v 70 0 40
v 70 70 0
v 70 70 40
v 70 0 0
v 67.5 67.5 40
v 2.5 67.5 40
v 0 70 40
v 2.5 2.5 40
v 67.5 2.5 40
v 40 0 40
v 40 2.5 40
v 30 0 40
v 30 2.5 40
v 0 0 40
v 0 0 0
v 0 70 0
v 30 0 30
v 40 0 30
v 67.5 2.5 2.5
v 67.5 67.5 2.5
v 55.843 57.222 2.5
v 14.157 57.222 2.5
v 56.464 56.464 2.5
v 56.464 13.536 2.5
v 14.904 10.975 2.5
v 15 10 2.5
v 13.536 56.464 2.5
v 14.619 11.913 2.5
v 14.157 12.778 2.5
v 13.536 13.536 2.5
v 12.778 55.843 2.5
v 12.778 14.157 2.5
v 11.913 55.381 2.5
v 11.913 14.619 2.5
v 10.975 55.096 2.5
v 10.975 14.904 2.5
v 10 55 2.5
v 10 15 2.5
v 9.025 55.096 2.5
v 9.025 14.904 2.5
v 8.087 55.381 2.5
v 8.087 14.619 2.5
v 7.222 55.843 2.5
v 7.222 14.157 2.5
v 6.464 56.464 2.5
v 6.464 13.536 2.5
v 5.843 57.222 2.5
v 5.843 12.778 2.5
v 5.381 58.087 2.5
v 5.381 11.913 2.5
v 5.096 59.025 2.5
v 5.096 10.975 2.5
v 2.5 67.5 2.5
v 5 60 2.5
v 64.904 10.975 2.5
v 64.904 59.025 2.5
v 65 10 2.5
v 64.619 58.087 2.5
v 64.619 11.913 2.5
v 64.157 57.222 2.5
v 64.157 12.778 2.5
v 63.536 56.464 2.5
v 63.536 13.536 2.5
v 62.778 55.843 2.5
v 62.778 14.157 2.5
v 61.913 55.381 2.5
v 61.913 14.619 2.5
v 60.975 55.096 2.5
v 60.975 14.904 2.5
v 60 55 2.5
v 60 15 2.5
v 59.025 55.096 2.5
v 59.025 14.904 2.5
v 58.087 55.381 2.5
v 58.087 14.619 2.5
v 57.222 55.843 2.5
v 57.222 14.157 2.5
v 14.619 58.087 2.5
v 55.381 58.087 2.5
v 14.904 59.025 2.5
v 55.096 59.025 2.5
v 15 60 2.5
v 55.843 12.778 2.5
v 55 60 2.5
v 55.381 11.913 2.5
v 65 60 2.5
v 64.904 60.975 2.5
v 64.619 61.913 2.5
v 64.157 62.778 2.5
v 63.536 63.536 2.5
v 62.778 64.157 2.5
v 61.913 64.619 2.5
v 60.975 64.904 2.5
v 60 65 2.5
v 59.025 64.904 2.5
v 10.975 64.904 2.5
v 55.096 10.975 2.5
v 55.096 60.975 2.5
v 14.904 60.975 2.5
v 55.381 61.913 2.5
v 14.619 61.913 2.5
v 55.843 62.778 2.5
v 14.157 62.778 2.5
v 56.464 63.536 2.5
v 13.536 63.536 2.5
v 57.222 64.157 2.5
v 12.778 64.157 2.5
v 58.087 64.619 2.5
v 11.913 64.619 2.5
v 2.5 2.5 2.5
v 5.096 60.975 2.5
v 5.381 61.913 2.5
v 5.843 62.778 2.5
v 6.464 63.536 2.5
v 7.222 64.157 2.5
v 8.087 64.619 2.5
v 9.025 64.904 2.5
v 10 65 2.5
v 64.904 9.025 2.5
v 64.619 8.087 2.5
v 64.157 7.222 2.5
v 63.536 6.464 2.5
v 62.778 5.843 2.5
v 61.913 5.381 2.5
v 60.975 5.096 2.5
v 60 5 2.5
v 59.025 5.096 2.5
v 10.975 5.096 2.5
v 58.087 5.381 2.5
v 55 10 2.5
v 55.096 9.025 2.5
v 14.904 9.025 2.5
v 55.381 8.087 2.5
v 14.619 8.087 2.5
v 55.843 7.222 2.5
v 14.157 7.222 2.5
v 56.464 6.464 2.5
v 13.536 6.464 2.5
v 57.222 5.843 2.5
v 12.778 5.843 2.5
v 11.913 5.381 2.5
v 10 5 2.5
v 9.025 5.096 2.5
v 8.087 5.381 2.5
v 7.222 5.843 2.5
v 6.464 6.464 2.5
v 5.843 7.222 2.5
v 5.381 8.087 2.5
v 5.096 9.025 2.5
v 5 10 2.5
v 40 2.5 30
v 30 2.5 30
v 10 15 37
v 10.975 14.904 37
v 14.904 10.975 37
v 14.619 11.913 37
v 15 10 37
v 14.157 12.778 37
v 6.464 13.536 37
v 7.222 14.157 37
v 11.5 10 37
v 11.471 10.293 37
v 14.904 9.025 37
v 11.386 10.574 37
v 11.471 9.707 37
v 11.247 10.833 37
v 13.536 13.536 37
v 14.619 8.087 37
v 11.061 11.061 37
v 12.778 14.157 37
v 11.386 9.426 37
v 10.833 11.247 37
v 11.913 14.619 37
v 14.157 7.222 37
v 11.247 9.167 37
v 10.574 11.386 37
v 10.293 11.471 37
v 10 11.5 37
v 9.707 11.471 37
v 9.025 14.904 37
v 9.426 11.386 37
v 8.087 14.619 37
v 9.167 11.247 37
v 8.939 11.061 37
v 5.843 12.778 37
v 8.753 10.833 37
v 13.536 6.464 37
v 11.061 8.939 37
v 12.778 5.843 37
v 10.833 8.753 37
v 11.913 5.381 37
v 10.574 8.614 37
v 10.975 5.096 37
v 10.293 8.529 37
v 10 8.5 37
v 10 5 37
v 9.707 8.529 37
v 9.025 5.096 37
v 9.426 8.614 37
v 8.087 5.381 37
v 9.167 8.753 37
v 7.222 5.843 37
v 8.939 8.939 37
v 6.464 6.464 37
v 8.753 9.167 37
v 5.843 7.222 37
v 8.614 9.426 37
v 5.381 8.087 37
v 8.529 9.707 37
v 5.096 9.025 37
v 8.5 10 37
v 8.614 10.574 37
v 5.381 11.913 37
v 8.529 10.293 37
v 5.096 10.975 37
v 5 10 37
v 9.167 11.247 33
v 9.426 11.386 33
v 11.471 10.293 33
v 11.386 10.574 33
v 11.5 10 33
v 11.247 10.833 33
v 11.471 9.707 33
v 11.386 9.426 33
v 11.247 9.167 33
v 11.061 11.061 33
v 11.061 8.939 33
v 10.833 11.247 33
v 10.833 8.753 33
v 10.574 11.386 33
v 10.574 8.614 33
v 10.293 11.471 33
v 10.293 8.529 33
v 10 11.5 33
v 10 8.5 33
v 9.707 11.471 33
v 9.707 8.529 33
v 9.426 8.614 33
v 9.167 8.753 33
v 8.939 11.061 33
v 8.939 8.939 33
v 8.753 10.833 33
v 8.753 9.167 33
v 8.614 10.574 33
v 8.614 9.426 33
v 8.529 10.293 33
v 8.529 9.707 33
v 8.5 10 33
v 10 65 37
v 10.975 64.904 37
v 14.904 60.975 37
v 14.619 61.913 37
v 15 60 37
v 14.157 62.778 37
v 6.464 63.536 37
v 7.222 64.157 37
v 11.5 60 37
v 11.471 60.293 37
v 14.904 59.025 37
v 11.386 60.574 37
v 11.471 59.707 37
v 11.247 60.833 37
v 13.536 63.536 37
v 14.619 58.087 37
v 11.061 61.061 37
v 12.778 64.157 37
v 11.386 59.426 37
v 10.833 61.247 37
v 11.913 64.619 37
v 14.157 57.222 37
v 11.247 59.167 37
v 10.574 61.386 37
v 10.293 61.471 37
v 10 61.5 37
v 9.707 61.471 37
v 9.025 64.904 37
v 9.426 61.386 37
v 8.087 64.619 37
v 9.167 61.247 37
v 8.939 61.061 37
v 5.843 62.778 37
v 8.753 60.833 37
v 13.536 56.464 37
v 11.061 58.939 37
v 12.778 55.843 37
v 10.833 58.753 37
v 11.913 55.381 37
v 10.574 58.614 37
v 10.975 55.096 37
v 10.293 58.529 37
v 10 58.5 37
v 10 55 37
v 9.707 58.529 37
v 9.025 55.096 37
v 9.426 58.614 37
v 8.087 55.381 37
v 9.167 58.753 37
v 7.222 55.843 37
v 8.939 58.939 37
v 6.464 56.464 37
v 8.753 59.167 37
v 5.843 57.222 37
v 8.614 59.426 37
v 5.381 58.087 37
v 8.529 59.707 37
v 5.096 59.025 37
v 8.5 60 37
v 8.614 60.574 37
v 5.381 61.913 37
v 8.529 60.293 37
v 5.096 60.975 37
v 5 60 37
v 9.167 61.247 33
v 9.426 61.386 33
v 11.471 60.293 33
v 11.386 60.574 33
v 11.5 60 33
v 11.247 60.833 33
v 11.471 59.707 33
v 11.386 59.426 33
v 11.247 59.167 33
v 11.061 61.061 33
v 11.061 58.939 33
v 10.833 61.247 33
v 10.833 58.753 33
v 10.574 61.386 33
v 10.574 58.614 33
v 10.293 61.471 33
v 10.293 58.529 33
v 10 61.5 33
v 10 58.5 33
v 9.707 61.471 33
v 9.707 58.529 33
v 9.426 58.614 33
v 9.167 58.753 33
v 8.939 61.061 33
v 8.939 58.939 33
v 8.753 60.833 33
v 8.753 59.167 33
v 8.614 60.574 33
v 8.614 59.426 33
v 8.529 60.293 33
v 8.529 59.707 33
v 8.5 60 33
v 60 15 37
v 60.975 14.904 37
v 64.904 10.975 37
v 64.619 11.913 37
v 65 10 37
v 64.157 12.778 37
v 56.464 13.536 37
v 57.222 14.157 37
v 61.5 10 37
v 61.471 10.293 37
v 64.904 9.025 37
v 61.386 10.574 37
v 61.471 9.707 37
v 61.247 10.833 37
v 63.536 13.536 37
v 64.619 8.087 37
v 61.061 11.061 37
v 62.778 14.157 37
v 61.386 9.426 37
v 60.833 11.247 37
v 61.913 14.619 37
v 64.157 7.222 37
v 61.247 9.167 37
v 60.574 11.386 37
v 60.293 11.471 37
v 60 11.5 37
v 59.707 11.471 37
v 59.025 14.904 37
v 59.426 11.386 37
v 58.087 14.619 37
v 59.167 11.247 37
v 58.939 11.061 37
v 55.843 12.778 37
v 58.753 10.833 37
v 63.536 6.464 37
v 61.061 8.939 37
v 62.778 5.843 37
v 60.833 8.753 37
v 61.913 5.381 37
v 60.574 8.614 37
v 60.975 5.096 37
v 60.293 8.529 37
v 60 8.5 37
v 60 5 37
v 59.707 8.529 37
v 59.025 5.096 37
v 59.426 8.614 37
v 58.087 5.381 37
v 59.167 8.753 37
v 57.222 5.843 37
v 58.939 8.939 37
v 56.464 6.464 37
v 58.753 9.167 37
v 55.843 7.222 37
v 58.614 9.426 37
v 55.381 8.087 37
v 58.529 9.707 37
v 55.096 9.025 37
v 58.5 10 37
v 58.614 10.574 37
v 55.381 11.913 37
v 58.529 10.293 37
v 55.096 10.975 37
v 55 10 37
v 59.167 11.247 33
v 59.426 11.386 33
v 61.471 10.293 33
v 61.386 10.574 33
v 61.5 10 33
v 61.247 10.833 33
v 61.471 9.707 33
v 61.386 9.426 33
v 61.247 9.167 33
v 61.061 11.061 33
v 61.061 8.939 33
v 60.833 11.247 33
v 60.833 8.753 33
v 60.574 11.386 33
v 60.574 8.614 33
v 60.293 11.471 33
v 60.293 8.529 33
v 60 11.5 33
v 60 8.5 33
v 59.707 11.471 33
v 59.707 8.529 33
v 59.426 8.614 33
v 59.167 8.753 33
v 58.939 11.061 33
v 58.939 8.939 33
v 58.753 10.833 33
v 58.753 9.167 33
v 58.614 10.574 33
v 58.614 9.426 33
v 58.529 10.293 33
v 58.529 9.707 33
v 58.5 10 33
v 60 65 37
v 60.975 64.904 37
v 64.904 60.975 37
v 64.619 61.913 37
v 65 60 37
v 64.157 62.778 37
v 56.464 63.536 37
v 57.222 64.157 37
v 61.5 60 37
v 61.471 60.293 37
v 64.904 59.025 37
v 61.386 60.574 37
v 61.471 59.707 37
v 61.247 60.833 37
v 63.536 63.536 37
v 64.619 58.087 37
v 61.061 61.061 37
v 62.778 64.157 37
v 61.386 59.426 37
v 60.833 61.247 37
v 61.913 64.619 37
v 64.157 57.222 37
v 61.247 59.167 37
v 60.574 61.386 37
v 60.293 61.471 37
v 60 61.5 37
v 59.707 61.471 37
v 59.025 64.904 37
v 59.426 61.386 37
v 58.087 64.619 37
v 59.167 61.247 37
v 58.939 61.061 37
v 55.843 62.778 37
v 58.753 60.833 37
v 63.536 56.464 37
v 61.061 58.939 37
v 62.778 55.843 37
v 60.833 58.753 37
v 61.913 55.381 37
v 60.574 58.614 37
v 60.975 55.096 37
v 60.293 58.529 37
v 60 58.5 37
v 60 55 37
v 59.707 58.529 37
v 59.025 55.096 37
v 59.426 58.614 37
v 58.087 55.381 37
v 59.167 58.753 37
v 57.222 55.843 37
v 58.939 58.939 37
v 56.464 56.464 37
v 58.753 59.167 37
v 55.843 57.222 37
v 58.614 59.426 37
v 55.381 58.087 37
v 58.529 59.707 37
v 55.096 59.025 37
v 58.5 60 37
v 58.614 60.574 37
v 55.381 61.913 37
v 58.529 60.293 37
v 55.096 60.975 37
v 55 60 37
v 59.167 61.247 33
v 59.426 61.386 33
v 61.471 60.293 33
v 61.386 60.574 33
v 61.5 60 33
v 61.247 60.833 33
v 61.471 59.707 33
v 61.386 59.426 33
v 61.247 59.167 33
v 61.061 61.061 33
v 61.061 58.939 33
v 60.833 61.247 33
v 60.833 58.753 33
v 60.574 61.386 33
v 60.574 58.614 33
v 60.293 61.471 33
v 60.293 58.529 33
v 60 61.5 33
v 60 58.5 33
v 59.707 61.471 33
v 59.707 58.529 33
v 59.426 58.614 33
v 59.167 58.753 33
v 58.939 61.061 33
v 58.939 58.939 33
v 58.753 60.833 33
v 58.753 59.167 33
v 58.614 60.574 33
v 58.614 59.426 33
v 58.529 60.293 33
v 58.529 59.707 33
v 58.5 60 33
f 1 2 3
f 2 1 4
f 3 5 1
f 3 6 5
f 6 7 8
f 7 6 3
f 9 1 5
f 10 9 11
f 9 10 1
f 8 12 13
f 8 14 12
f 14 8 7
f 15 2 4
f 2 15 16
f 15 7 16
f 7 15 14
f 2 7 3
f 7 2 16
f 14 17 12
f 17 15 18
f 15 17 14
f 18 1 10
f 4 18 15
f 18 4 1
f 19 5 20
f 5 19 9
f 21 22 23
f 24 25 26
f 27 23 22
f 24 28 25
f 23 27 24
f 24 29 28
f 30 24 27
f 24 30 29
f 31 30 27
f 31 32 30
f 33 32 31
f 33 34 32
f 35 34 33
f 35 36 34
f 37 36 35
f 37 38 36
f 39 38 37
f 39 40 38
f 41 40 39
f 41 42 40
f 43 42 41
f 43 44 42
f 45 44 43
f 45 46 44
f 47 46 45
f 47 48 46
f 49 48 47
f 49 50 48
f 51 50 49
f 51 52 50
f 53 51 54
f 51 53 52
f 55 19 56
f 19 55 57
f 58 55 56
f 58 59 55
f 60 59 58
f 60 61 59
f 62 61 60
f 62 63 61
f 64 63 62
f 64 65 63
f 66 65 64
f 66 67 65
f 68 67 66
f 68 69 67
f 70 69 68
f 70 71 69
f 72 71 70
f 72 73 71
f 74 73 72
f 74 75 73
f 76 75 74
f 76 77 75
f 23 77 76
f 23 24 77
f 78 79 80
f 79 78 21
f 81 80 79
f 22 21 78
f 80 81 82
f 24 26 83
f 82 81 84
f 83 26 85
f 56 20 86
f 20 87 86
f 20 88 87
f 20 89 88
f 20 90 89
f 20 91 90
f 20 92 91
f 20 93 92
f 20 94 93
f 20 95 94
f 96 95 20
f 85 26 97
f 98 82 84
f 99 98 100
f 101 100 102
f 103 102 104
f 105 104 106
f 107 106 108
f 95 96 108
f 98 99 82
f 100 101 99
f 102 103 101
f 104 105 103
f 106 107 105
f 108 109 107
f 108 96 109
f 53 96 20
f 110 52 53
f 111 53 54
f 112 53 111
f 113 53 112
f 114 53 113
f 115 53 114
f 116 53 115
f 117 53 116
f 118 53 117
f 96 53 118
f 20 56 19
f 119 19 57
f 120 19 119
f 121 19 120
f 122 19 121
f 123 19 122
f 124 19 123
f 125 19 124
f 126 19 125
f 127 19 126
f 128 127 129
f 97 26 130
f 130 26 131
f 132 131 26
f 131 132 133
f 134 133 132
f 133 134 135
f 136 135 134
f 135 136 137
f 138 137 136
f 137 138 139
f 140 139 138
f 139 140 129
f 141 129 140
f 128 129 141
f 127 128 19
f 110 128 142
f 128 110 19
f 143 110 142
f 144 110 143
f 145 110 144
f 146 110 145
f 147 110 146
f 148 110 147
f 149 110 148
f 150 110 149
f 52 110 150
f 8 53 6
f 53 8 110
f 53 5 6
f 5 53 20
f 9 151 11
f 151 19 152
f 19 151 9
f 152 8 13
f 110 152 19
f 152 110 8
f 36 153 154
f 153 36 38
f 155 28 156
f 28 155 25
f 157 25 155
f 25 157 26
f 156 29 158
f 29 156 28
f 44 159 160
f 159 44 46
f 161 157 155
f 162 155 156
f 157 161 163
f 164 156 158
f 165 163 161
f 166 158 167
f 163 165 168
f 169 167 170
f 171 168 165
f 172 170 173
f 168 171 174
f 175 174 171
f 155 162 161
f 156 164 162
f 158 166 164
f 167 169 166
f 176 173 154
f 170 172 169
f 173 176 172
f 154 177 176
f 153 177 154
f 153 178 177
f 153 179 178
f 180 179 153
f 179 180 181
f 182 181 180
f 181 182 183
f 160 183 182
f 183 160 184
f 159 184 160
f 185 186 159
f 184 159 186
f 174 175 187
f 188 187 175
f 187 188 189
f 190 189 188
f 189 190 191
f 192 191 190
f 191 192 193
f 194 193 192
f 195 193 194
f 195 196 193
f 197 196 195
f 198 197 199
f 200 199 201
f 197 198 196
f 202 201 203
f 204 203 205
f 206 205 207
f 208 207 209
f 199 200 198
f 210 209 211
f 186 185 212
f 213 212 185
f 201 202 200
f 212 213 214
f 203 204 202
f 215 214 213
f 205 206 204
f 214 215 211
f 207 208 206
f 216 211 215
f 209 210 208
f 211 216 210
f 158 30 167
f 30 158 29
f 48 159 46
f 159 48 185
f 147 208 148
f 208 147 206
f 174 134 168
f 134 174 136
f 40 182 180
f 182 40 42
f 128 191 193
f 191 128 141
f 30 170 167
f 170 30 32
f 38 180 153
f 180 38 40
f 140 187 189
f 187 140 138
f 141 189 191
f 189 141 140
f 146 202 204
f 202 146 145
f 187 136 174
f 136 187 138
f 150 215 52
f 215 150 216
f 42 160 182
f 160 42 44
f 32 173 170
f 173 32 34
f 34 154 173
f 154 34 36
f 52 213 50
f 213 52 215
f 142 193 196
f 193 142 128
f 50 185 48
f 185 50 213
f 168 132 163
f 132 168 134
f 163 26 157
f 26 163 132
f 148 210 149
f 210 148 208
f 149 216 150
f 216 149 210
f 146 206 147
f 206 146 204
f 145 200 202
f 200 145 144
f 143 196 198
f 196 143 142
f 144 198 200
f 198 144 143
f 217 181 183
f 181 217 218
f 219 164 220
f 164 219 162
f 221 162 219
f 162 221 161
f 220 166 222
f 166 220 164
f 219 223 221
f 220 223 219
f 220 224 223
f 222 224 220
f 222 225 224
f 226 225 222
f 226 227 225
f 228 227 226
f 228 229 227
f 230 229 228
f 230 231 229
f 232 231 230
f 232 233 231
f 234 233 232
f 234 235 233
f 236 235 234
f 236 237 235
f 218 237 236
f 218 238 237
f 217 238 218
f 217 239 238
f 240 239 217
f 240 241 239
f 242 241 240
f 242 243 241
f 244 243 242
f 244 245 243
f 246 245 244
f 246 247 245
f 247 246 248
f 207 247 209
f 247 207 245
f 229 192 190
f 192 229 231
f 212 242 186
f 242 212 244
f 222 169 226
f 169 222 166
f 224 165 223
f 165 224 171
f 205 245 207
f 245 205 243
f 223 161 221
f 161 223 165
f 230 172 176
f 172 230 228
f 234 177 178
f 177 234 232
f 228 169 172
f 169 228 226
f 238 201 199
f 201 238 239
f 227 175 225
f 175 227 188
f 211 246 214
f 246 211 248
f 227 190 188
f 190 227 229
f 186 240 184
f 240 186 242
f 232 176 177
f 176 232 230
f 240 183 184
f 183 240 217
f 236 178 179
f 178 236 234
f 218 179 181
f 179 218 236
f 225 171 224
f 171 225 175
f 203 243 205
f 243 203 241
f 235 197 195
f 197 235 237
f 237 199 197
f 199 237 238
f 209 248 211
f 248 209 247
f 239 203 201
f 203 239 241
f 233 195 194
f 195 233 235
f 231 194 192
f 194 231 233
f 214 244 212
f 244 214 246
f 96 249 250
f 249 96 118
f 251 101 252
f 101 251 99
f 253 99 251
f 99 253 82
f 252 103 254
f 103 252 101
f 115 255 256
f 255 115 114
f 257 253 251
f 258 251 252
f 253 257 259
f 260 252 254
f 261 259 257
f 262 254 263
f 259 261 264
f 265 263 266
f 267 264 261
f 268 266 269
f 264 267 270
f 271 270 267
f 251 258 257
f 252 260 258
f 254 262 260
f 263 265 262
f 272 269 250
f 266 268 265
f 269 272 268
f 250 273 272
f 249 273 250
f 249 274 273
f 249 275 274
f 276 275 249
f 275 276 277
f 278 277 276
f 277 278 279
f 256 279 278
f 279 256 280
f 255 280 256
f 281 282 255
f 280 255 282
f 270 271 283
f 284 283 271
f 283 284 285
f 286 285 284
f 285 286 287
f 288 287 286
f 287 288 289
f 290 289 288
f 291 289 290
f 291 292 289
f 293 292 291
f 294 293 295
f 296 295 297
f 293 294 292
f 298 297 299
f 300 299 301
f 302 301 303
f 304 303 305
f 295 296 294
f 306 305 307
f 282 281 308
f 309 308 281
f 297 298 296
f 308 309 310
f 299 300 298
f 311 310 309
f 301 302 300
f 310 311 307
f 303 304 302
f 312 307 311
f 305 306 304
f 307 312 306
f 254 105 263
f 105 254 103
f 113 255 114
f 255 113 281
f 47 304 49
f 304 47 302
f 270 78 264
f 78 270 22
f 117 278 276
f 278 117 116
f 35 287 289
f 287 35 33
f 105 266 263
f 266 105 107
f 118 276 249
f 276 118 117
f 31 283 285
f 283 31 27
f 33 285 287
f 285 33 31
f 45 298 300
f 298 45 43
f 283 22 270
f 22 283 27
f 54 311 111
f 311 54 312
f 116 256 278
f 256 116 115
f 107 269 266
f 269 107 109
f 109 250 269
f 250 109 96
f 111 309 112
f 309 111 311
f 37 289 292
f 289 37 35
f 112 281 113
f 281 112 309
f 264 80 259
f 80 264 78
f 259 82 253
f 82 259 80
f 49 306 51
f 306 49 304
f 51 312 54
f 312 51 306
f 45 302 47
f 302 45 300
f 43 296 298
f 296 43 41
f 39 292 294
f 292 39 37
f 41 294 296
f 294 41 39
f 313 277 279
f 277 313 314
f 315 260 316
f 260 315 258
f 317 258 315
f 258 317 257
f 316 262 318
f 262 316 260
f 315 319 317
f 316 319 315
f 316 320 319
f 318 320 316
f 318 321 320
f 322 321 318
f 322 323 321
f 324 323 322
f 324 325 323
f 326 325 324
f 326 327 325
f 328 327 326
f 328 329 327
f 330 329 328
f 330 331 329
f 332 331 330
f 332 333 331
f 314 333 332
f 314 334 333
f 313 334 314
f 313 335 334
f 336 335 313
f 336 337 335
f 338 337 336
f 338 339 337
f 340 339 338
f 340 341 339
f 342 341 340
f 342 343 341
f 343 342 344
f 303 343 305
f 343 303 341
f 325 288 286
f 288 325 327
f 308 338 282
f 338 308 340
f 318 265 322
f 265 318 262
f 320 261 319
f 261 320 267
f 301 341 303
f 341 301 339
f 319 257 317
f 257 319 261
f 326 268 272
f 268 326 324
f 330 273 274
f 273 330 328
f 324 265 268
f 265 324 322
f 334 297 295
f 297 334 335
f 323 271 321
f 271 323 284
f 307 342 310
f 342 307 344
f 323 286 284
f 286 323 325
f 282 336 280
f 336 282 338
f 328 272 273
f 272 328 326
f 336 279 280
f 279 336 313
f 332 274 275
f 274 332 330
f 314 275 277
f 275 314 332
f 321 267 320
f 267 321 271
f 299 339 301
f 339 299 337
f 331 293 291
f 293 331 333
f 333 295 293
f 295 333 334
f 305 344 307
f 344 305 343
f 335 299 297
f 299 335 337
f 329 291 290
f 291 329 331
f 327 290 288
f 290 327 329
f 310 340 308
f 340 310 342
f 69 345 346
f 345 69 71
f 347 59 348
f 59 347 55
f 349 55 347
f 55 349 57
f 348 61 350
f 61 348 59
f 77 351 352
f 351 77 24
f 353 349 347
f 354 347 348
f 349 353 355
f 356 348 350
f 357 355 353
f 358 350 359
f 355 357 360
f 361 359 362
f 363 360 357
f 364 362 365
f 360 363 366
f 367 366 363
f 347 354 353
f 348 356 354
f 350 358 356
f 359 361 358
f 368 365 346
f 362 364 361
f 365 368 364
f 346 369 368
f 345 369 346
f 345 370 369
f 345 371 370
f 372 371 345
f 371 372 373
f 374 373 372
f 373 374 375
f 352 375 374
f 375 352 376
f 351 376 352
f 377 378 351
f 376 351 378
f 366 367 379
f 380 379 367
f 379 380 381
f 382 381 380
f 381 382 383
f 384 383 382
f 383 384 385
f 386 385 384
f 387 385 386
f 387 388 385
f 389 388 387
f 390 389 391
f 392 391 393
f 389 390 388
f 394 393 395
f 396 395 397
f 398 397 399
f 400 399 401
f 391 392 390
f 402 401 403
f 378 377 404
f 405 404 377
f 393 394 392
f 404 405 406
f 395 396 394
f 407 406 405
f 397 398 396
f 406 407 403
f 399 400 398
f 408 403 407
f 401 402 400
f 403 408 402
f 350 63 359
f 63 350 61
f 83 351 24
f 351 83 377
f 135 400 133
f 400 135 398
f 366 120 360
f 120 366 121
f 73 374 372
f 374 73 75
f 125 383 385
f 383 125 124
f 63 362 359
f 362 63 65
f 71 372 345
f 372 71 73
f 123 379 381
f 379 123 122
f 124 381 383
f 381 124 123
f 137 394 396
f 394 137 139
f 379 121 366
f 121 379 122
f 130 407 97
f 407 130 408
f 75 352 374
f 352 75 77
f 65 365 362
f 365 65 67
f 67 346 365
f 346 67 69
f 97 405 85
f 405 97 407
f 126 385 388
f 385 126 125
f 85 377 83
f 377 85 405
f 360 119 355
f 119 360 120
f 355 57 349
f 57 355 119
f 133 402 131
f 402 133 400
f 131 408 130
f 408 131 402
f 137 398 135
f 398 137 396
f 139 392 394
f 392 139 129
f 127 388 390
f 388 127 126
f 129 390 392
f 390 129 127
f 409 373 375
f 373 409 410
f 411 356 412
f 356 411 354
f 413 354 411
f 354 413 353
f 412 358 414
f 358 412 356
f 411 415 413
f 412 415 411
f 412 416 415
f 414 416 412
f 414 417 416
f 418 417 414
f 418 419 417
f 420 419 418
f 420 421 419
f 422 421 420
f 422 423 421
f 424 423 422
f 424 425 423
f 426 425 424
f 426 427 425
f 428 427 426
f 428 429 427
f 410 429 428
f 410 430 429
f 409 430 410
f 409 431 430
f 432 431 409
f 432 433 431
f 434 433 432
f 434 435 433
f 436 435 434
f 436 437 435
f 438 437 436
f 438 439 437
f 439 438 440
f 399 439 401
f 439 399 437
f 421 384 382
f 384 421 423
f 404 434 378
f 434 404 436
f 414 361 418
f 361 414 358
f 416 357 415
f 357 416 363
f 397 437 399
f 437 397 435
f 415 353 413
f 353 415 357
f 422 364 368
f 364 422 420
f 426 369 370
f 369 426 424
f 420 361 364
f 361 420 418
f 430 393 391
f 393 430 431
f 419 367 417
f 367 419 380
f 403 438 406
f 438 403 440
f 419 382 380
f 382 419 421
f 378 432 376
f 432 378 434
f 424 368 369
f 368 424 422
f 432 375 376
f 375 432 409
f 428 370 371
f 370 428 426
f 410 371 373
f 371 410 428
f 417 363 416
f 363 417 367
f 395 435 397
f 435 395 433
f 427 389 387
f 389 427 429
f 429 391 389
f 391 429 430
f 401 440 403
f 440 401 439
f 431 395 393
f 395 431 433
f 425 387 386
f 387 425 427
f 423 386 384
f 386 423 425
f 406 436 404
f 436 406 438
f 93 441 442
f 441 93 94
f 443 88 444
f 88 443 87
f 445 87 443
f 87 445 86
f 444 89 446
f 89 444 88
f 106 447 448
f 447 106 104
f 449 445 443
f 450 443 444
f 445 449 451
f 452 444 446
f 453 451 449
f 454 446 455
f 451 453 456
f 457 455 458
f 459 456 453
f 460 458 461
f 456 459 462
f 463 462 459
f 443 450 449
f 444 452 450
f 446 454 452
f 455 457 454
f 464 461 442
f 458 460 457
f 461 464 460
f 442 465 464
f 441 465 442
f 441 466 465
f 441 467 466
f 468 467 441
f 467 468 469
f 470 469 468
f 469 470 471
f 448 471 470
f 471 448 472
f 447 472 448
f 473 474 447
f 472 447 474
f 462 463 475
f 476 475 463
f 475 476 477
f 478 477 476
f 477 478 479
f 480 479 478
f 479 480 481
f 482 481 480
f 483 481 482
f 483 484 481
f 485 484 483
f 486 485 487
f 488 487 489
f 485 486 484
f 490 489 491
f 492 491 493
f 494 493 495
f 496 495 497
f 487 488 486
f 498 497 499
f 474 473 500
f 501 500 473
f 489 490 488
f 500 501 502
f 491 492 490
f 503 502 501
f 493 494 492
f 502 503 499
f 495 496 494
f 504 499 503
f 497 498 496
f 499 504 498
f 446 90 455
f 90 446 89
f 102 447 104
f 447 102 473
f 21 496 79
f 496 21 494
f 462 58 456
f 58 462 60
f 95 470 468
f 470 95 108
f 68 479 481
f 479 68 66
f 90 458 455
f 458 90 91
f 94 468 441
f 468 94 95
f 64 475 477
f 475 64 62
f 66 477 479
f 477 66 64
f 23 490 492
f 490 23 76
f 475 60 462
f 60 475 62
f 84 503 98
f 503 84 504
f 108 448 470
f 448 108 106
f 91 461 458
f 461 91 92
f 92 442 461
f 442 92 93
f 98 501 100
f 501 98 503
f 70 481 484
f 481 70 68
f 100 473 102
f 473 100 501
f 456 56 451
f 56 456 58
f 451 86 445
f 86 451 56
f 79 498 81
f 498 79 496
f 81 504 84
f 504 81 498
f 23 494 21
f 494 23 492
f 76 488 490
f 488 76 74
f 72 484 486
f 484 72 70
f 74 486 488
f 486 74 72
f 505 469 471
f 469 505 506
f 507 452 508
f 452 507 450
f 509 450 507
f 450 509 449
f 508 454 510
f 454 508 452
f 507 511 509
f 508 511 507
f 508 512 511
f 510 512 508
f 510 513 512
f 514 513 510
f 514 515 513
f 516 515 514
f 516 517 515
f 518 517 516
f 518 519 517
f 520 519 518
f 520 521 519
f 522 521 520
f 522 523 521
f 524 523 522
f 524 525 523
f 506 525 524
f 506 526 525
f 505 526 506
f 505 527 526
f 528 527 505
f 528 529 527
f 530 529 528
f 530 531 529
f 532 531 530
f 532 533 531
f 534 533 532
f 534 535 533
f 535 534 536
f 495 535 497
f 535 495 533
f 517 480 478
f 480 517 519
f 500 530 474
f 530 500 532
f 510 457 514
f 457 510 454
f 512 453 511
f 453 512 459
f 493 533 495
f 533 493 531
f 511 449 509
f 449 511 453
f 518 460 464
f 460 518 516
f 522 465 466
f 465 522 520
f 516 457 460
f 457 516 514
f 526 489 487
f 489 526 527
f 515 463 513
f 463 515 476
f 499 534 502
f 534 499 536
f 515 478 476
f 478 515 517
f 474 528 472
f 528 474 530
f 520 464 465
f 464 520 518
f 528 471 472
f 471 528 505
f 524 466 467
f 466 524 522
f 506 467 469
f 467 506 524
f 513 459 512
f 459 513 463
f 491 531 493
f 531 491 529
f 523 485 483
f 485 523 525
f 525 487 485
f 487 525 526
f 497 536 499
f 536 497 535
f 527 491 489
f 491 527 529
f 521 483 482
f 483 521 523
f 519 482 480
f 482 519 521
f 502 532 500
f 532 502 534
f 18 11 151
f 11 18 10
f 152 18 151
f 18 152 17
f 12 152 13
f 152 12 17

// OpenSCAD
$fn = 32;

// ----------------------------------------------------------------------
// Enclosure box: both enclosure
// ----------------------------------------------------------------------

// --- parameters (mm) ---
box_l = 70;               // outer length, X
box_w = 70;               // outer width, Y
box_h = 40;               // outer height
wall_t = 2.5;             // wall thickness
boss_r = 5;               // corner boss radius
hole_r = 1.5;             // boss screw hole radius
boss_in = 10;             // boss inset from the corners
notch_w = 10;             // cable notch width
notch_h = 10;             // cable notch height

inner_h = box_h - wall_t;  // cavity depth
boss_h = inner_h - 2;  // corner boss height

difference() {
  union() {
    difference() {
      cube([box_l, box_w, box_h]);
      translate([wall_t, wall_t, wall_t])
        cube([box_l - 2 * wall_t, box_w - 2 * wall_t, box_h]);
    }
    for (sx = [0, 1], sy = [0, 1])
      translate([sx ? box_l - boss_in : boss_in,
                 sy ? box_w - boss_in : boss_in, wall_t - 1])
        difference() {
          cylinder(r = boss_r, h = boss_h);
          translate([0, 0, boss_h - 4])
            cylinder(r = hole_r, h = 5);
        }
  }
  translate([box_l / 2 - notch_w / 2, -1, box_h - notch_h])
    cube([notch_w, wall_t + 2, notch_h + 1]);
}
